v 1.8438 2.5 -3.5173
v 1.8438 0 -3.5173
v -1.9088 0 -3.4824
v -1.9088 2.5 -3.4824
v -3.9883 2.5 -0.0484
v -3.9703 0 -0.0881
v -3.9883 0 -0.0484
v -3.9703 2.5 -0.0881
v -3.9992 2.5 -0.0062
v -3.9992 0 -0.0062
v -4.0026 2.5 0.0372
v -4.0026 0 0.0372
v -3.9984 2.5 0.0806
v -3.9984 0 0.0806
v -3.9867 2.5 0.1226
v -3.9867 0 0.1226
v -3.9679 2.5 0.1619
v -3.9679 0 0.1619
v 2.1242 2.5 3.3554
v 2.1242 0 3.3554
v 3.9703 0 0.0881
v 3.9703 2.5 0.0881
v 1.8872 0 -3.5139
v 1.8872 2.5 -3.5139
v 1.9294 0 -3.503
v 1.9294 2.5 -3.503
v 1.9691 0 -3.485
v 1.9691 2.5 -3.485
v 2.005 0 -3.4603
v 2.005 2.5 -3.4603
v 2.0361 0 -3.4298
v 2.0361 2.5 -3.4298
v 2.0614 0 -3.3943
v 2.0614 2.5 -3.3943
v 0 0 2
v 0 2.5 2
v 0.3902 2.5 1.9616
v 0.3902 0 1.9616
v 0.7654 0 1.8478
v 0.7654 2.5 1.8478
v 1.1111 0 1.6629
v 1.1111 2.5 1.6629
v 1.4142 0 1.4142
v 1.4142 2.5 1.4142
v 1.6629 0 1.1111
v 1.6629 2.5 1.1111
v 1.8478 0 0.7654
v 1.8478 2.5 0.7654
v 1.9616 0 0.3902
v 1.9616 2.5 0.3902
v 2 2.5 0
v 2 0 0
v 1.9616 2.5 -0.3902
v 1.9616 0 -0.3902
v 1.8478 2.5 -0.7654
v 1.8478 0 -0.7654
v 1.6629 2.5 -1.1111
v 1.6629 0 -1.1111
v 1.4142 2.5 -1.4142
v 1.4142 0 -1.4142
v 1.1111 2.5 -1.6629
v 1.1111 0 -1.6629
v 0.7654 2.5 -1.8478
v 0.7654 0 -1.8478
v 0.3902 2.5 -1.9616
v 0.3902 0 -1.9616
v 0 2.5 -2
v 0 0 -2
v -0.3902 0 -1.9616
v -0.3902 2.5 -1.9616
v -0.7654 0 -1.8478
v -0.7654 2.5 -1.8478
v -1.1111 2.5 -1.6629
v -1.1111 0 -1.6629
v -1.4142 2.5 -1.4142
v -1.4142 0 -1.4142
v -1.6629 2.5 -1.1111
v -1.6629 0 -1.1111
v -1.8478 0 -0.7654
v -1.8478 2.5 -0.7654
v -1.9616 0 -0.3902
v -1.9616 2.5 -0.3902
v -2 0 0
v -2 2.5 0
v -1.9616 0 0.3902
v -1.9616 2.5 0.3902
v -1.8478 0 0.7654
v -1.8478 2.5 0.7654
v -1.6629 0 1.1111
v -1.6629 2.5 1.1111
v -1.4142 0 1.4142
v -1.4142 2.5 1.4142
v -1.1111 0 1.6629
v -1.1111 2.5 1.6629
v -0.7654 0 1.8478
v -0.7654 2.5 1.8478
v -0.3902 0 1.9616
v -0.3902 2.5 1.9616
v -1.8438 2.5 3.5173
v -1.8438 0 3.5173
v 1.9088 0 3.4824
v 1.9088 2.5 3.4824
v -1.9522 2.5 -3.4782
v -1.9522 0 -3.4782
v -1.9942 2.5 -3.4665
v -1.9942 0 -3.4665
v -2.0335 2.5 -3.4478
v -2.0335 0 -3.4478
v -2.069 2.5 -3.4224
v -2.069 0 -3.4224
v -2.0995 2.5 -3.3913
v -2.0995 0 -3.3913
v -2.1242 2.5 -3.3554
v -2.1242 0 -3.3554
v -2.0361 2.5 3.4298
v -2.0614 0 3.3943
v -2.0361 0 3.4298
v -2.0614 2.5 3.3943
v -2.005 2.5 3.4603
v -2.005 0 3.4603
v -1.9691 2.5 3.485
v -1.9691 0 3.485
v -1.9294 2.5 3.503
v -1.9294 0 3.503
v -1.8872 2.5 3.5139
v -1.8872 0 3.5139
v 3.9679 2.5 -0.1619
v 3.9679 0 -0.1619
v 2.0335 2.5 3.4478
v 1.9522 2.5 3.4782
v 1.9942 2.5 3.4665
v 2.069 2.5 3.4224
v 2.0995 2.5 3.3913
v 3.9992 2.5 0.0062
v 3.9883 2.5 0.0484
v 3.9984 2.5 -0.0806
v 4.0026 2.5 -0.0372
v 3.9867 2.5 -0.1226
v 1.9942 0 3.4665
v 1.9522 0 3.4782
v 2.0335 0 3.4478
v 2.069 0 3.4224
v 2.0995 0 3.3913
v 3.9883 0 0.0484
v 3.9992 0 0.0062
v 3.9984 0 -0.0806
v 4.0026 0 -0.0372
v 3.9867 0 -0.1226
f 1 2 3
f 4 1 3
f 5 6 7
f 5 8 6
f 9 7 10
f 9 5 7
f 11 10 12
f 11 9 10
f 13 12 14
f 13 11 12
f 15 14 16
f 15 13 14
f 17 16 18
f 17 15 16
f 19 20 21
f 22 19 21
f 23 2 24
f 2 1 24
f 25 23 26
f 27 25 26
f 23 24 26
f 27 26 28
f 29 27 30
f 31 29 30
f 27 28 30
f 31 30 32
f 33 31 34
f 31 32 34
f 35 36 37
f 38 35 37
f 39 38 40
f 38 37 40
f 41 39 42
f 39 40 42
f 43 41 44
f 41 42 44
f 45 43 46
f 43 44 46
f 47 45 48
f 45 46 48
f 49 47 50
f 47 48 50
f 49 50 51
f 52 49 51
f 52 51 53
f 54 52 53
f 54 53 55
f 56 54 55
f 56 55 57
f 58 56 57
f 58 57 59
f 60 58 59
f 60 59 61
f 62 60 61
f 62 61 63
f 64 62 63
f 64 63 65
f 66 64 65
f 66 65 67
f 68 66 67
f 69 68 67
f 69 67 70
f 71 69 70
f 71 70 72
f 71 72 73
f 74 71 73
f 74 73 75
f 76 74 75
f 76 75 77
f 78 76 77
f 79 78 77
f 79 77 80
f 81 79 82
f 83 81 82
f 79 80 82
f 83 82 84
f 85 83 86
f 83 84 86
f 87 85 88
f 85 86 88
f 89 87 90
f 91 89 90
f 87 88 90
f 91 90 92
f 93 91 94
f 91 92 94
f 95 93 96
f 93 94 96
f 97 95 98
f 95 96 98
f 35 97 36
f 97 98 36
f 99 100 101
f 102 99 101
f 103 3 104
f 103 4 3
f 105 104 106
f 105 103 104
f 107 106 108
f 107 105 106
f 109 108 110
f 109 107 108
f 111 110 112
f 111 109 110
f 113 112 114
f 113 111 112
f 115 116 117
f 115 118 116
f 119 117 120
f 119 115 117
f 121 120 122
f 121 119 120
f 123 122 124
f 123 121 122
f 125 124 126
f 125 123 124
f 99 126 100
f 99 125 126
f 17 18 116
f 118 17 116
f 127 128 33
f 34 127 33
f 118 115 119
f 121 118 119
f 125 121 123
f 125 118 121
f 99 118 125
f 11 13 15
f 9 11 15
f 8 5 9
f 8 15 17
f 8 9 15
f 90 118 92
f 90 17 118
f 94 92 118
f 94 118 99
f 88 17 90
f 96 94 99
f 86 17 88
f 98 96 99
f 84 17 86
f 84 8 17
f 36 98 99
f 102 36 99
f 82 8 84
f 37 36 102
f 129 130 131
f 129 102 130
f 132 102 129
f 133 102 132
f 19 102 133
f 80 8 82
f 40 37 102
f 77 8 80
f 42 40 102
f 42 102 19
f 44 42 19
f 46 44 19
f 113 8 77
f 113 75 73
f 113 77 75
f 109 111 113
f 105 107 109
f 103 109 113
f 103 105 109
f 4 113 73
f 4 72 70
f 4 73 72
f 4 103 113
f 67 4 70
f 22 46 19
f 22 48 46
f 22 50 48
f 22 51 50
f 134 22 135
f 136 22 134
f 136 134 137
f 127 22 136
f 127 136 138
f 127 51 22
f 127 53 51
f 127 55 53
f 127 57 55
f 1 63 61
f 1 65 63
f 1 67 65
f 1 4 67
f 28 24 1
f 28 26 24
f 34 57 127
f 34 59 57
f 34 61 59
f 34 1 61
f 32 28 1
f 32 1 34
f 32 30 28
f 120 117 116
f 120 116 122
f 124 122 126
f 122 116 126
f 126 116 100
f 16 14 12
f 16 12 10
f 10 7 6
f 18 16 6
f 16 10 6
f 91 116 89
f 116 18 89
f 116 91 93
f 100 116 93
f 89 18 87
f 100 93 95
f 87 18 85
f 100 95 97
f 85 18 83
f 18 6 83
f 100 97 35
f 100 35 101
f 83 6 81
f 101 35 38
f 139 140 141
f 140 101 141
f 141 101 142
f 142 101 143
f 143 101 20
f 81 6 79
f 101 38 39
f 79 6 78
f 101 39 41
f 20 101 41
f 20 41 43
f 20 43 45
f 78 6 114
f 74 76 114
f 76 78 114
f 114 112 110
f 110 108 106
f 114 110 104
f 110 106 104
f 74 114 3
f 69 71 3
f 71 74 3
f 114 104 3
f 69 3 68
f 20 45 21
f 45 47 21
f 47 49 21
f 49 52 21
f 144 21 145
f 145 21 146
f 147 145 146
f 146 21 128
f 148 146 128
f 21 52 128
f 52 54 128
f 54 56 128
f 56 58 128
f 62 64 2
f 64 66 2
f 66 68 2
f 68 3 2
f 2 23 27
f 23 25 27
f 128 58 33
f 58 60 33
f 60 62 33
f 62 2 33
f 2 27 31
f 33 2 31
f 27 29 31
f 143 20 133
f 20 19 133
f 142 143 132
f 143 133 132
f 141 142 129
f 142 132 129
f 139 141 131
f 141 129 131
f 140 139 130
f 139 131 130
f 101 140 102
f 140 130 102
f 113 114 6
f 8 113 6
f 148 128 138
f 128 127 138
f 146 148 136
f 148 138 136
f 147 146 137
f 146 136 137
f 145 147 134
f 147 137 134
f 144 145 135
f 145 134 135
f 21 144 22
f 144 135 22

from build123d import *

# Parameters (mm, degrees)
BOSS_EXTRUDE1_DEPTH = 2.5
SKETCH2_R           = 2
CUT_EXTRUDE1_DEPTH  = 6.912925747
FILLET1_R           = 0.25


with BuildPart() as part:
    # Sketch1 → Boss-Extrude1 (new body)
    with BuildSketch(Plane(origin=(0, 0, 0), x_dir=(1, 0, 0), z_dir=(0, 1, 0))):
        Polygon((1.98810578, 3.518631658), (-2.053171512, 3.481065939), (-4.041277292, -0.037565718), (-1.98810578, -3.518631658), (2.053171512, -3.481065939), (4.041277292, 0.037565718), align=None)
    extrude(amount=BOSS_EXTRUDE1_DEPTH)

    # Sketch2 → Cut-Extrude1 (cut, through all)
    with BuildSketch(Plane(origin=(0, 2.5, 0), x_dir=(1, 0, 0), z_dir=(0, 1, 0))):
        Circle(SKETCH2_R)
    extrude(amount=-CUT_EXTRUDE1_DEPTH, mode=Mode.SUBTRACT)

    # Fillet1
    fillet1_edges = [part.edges().sort_by_distance(p)[0] for p in [
        (2.053171512, 1.25, 3.481065939),
        (4.041277292, 1.25, -0.037565718),
        (1.98810578, 1.25, -3.518631658),
        (-2.053171512, 1.25, -3.481065939),
        (-4.041277292, 1.25, 0.037565718),
        (-1.98810578, 1.25, 3.518631658),
    ]]
    fillet(fillet1_edges, radius=FILLET1_R)


solid = part.part
